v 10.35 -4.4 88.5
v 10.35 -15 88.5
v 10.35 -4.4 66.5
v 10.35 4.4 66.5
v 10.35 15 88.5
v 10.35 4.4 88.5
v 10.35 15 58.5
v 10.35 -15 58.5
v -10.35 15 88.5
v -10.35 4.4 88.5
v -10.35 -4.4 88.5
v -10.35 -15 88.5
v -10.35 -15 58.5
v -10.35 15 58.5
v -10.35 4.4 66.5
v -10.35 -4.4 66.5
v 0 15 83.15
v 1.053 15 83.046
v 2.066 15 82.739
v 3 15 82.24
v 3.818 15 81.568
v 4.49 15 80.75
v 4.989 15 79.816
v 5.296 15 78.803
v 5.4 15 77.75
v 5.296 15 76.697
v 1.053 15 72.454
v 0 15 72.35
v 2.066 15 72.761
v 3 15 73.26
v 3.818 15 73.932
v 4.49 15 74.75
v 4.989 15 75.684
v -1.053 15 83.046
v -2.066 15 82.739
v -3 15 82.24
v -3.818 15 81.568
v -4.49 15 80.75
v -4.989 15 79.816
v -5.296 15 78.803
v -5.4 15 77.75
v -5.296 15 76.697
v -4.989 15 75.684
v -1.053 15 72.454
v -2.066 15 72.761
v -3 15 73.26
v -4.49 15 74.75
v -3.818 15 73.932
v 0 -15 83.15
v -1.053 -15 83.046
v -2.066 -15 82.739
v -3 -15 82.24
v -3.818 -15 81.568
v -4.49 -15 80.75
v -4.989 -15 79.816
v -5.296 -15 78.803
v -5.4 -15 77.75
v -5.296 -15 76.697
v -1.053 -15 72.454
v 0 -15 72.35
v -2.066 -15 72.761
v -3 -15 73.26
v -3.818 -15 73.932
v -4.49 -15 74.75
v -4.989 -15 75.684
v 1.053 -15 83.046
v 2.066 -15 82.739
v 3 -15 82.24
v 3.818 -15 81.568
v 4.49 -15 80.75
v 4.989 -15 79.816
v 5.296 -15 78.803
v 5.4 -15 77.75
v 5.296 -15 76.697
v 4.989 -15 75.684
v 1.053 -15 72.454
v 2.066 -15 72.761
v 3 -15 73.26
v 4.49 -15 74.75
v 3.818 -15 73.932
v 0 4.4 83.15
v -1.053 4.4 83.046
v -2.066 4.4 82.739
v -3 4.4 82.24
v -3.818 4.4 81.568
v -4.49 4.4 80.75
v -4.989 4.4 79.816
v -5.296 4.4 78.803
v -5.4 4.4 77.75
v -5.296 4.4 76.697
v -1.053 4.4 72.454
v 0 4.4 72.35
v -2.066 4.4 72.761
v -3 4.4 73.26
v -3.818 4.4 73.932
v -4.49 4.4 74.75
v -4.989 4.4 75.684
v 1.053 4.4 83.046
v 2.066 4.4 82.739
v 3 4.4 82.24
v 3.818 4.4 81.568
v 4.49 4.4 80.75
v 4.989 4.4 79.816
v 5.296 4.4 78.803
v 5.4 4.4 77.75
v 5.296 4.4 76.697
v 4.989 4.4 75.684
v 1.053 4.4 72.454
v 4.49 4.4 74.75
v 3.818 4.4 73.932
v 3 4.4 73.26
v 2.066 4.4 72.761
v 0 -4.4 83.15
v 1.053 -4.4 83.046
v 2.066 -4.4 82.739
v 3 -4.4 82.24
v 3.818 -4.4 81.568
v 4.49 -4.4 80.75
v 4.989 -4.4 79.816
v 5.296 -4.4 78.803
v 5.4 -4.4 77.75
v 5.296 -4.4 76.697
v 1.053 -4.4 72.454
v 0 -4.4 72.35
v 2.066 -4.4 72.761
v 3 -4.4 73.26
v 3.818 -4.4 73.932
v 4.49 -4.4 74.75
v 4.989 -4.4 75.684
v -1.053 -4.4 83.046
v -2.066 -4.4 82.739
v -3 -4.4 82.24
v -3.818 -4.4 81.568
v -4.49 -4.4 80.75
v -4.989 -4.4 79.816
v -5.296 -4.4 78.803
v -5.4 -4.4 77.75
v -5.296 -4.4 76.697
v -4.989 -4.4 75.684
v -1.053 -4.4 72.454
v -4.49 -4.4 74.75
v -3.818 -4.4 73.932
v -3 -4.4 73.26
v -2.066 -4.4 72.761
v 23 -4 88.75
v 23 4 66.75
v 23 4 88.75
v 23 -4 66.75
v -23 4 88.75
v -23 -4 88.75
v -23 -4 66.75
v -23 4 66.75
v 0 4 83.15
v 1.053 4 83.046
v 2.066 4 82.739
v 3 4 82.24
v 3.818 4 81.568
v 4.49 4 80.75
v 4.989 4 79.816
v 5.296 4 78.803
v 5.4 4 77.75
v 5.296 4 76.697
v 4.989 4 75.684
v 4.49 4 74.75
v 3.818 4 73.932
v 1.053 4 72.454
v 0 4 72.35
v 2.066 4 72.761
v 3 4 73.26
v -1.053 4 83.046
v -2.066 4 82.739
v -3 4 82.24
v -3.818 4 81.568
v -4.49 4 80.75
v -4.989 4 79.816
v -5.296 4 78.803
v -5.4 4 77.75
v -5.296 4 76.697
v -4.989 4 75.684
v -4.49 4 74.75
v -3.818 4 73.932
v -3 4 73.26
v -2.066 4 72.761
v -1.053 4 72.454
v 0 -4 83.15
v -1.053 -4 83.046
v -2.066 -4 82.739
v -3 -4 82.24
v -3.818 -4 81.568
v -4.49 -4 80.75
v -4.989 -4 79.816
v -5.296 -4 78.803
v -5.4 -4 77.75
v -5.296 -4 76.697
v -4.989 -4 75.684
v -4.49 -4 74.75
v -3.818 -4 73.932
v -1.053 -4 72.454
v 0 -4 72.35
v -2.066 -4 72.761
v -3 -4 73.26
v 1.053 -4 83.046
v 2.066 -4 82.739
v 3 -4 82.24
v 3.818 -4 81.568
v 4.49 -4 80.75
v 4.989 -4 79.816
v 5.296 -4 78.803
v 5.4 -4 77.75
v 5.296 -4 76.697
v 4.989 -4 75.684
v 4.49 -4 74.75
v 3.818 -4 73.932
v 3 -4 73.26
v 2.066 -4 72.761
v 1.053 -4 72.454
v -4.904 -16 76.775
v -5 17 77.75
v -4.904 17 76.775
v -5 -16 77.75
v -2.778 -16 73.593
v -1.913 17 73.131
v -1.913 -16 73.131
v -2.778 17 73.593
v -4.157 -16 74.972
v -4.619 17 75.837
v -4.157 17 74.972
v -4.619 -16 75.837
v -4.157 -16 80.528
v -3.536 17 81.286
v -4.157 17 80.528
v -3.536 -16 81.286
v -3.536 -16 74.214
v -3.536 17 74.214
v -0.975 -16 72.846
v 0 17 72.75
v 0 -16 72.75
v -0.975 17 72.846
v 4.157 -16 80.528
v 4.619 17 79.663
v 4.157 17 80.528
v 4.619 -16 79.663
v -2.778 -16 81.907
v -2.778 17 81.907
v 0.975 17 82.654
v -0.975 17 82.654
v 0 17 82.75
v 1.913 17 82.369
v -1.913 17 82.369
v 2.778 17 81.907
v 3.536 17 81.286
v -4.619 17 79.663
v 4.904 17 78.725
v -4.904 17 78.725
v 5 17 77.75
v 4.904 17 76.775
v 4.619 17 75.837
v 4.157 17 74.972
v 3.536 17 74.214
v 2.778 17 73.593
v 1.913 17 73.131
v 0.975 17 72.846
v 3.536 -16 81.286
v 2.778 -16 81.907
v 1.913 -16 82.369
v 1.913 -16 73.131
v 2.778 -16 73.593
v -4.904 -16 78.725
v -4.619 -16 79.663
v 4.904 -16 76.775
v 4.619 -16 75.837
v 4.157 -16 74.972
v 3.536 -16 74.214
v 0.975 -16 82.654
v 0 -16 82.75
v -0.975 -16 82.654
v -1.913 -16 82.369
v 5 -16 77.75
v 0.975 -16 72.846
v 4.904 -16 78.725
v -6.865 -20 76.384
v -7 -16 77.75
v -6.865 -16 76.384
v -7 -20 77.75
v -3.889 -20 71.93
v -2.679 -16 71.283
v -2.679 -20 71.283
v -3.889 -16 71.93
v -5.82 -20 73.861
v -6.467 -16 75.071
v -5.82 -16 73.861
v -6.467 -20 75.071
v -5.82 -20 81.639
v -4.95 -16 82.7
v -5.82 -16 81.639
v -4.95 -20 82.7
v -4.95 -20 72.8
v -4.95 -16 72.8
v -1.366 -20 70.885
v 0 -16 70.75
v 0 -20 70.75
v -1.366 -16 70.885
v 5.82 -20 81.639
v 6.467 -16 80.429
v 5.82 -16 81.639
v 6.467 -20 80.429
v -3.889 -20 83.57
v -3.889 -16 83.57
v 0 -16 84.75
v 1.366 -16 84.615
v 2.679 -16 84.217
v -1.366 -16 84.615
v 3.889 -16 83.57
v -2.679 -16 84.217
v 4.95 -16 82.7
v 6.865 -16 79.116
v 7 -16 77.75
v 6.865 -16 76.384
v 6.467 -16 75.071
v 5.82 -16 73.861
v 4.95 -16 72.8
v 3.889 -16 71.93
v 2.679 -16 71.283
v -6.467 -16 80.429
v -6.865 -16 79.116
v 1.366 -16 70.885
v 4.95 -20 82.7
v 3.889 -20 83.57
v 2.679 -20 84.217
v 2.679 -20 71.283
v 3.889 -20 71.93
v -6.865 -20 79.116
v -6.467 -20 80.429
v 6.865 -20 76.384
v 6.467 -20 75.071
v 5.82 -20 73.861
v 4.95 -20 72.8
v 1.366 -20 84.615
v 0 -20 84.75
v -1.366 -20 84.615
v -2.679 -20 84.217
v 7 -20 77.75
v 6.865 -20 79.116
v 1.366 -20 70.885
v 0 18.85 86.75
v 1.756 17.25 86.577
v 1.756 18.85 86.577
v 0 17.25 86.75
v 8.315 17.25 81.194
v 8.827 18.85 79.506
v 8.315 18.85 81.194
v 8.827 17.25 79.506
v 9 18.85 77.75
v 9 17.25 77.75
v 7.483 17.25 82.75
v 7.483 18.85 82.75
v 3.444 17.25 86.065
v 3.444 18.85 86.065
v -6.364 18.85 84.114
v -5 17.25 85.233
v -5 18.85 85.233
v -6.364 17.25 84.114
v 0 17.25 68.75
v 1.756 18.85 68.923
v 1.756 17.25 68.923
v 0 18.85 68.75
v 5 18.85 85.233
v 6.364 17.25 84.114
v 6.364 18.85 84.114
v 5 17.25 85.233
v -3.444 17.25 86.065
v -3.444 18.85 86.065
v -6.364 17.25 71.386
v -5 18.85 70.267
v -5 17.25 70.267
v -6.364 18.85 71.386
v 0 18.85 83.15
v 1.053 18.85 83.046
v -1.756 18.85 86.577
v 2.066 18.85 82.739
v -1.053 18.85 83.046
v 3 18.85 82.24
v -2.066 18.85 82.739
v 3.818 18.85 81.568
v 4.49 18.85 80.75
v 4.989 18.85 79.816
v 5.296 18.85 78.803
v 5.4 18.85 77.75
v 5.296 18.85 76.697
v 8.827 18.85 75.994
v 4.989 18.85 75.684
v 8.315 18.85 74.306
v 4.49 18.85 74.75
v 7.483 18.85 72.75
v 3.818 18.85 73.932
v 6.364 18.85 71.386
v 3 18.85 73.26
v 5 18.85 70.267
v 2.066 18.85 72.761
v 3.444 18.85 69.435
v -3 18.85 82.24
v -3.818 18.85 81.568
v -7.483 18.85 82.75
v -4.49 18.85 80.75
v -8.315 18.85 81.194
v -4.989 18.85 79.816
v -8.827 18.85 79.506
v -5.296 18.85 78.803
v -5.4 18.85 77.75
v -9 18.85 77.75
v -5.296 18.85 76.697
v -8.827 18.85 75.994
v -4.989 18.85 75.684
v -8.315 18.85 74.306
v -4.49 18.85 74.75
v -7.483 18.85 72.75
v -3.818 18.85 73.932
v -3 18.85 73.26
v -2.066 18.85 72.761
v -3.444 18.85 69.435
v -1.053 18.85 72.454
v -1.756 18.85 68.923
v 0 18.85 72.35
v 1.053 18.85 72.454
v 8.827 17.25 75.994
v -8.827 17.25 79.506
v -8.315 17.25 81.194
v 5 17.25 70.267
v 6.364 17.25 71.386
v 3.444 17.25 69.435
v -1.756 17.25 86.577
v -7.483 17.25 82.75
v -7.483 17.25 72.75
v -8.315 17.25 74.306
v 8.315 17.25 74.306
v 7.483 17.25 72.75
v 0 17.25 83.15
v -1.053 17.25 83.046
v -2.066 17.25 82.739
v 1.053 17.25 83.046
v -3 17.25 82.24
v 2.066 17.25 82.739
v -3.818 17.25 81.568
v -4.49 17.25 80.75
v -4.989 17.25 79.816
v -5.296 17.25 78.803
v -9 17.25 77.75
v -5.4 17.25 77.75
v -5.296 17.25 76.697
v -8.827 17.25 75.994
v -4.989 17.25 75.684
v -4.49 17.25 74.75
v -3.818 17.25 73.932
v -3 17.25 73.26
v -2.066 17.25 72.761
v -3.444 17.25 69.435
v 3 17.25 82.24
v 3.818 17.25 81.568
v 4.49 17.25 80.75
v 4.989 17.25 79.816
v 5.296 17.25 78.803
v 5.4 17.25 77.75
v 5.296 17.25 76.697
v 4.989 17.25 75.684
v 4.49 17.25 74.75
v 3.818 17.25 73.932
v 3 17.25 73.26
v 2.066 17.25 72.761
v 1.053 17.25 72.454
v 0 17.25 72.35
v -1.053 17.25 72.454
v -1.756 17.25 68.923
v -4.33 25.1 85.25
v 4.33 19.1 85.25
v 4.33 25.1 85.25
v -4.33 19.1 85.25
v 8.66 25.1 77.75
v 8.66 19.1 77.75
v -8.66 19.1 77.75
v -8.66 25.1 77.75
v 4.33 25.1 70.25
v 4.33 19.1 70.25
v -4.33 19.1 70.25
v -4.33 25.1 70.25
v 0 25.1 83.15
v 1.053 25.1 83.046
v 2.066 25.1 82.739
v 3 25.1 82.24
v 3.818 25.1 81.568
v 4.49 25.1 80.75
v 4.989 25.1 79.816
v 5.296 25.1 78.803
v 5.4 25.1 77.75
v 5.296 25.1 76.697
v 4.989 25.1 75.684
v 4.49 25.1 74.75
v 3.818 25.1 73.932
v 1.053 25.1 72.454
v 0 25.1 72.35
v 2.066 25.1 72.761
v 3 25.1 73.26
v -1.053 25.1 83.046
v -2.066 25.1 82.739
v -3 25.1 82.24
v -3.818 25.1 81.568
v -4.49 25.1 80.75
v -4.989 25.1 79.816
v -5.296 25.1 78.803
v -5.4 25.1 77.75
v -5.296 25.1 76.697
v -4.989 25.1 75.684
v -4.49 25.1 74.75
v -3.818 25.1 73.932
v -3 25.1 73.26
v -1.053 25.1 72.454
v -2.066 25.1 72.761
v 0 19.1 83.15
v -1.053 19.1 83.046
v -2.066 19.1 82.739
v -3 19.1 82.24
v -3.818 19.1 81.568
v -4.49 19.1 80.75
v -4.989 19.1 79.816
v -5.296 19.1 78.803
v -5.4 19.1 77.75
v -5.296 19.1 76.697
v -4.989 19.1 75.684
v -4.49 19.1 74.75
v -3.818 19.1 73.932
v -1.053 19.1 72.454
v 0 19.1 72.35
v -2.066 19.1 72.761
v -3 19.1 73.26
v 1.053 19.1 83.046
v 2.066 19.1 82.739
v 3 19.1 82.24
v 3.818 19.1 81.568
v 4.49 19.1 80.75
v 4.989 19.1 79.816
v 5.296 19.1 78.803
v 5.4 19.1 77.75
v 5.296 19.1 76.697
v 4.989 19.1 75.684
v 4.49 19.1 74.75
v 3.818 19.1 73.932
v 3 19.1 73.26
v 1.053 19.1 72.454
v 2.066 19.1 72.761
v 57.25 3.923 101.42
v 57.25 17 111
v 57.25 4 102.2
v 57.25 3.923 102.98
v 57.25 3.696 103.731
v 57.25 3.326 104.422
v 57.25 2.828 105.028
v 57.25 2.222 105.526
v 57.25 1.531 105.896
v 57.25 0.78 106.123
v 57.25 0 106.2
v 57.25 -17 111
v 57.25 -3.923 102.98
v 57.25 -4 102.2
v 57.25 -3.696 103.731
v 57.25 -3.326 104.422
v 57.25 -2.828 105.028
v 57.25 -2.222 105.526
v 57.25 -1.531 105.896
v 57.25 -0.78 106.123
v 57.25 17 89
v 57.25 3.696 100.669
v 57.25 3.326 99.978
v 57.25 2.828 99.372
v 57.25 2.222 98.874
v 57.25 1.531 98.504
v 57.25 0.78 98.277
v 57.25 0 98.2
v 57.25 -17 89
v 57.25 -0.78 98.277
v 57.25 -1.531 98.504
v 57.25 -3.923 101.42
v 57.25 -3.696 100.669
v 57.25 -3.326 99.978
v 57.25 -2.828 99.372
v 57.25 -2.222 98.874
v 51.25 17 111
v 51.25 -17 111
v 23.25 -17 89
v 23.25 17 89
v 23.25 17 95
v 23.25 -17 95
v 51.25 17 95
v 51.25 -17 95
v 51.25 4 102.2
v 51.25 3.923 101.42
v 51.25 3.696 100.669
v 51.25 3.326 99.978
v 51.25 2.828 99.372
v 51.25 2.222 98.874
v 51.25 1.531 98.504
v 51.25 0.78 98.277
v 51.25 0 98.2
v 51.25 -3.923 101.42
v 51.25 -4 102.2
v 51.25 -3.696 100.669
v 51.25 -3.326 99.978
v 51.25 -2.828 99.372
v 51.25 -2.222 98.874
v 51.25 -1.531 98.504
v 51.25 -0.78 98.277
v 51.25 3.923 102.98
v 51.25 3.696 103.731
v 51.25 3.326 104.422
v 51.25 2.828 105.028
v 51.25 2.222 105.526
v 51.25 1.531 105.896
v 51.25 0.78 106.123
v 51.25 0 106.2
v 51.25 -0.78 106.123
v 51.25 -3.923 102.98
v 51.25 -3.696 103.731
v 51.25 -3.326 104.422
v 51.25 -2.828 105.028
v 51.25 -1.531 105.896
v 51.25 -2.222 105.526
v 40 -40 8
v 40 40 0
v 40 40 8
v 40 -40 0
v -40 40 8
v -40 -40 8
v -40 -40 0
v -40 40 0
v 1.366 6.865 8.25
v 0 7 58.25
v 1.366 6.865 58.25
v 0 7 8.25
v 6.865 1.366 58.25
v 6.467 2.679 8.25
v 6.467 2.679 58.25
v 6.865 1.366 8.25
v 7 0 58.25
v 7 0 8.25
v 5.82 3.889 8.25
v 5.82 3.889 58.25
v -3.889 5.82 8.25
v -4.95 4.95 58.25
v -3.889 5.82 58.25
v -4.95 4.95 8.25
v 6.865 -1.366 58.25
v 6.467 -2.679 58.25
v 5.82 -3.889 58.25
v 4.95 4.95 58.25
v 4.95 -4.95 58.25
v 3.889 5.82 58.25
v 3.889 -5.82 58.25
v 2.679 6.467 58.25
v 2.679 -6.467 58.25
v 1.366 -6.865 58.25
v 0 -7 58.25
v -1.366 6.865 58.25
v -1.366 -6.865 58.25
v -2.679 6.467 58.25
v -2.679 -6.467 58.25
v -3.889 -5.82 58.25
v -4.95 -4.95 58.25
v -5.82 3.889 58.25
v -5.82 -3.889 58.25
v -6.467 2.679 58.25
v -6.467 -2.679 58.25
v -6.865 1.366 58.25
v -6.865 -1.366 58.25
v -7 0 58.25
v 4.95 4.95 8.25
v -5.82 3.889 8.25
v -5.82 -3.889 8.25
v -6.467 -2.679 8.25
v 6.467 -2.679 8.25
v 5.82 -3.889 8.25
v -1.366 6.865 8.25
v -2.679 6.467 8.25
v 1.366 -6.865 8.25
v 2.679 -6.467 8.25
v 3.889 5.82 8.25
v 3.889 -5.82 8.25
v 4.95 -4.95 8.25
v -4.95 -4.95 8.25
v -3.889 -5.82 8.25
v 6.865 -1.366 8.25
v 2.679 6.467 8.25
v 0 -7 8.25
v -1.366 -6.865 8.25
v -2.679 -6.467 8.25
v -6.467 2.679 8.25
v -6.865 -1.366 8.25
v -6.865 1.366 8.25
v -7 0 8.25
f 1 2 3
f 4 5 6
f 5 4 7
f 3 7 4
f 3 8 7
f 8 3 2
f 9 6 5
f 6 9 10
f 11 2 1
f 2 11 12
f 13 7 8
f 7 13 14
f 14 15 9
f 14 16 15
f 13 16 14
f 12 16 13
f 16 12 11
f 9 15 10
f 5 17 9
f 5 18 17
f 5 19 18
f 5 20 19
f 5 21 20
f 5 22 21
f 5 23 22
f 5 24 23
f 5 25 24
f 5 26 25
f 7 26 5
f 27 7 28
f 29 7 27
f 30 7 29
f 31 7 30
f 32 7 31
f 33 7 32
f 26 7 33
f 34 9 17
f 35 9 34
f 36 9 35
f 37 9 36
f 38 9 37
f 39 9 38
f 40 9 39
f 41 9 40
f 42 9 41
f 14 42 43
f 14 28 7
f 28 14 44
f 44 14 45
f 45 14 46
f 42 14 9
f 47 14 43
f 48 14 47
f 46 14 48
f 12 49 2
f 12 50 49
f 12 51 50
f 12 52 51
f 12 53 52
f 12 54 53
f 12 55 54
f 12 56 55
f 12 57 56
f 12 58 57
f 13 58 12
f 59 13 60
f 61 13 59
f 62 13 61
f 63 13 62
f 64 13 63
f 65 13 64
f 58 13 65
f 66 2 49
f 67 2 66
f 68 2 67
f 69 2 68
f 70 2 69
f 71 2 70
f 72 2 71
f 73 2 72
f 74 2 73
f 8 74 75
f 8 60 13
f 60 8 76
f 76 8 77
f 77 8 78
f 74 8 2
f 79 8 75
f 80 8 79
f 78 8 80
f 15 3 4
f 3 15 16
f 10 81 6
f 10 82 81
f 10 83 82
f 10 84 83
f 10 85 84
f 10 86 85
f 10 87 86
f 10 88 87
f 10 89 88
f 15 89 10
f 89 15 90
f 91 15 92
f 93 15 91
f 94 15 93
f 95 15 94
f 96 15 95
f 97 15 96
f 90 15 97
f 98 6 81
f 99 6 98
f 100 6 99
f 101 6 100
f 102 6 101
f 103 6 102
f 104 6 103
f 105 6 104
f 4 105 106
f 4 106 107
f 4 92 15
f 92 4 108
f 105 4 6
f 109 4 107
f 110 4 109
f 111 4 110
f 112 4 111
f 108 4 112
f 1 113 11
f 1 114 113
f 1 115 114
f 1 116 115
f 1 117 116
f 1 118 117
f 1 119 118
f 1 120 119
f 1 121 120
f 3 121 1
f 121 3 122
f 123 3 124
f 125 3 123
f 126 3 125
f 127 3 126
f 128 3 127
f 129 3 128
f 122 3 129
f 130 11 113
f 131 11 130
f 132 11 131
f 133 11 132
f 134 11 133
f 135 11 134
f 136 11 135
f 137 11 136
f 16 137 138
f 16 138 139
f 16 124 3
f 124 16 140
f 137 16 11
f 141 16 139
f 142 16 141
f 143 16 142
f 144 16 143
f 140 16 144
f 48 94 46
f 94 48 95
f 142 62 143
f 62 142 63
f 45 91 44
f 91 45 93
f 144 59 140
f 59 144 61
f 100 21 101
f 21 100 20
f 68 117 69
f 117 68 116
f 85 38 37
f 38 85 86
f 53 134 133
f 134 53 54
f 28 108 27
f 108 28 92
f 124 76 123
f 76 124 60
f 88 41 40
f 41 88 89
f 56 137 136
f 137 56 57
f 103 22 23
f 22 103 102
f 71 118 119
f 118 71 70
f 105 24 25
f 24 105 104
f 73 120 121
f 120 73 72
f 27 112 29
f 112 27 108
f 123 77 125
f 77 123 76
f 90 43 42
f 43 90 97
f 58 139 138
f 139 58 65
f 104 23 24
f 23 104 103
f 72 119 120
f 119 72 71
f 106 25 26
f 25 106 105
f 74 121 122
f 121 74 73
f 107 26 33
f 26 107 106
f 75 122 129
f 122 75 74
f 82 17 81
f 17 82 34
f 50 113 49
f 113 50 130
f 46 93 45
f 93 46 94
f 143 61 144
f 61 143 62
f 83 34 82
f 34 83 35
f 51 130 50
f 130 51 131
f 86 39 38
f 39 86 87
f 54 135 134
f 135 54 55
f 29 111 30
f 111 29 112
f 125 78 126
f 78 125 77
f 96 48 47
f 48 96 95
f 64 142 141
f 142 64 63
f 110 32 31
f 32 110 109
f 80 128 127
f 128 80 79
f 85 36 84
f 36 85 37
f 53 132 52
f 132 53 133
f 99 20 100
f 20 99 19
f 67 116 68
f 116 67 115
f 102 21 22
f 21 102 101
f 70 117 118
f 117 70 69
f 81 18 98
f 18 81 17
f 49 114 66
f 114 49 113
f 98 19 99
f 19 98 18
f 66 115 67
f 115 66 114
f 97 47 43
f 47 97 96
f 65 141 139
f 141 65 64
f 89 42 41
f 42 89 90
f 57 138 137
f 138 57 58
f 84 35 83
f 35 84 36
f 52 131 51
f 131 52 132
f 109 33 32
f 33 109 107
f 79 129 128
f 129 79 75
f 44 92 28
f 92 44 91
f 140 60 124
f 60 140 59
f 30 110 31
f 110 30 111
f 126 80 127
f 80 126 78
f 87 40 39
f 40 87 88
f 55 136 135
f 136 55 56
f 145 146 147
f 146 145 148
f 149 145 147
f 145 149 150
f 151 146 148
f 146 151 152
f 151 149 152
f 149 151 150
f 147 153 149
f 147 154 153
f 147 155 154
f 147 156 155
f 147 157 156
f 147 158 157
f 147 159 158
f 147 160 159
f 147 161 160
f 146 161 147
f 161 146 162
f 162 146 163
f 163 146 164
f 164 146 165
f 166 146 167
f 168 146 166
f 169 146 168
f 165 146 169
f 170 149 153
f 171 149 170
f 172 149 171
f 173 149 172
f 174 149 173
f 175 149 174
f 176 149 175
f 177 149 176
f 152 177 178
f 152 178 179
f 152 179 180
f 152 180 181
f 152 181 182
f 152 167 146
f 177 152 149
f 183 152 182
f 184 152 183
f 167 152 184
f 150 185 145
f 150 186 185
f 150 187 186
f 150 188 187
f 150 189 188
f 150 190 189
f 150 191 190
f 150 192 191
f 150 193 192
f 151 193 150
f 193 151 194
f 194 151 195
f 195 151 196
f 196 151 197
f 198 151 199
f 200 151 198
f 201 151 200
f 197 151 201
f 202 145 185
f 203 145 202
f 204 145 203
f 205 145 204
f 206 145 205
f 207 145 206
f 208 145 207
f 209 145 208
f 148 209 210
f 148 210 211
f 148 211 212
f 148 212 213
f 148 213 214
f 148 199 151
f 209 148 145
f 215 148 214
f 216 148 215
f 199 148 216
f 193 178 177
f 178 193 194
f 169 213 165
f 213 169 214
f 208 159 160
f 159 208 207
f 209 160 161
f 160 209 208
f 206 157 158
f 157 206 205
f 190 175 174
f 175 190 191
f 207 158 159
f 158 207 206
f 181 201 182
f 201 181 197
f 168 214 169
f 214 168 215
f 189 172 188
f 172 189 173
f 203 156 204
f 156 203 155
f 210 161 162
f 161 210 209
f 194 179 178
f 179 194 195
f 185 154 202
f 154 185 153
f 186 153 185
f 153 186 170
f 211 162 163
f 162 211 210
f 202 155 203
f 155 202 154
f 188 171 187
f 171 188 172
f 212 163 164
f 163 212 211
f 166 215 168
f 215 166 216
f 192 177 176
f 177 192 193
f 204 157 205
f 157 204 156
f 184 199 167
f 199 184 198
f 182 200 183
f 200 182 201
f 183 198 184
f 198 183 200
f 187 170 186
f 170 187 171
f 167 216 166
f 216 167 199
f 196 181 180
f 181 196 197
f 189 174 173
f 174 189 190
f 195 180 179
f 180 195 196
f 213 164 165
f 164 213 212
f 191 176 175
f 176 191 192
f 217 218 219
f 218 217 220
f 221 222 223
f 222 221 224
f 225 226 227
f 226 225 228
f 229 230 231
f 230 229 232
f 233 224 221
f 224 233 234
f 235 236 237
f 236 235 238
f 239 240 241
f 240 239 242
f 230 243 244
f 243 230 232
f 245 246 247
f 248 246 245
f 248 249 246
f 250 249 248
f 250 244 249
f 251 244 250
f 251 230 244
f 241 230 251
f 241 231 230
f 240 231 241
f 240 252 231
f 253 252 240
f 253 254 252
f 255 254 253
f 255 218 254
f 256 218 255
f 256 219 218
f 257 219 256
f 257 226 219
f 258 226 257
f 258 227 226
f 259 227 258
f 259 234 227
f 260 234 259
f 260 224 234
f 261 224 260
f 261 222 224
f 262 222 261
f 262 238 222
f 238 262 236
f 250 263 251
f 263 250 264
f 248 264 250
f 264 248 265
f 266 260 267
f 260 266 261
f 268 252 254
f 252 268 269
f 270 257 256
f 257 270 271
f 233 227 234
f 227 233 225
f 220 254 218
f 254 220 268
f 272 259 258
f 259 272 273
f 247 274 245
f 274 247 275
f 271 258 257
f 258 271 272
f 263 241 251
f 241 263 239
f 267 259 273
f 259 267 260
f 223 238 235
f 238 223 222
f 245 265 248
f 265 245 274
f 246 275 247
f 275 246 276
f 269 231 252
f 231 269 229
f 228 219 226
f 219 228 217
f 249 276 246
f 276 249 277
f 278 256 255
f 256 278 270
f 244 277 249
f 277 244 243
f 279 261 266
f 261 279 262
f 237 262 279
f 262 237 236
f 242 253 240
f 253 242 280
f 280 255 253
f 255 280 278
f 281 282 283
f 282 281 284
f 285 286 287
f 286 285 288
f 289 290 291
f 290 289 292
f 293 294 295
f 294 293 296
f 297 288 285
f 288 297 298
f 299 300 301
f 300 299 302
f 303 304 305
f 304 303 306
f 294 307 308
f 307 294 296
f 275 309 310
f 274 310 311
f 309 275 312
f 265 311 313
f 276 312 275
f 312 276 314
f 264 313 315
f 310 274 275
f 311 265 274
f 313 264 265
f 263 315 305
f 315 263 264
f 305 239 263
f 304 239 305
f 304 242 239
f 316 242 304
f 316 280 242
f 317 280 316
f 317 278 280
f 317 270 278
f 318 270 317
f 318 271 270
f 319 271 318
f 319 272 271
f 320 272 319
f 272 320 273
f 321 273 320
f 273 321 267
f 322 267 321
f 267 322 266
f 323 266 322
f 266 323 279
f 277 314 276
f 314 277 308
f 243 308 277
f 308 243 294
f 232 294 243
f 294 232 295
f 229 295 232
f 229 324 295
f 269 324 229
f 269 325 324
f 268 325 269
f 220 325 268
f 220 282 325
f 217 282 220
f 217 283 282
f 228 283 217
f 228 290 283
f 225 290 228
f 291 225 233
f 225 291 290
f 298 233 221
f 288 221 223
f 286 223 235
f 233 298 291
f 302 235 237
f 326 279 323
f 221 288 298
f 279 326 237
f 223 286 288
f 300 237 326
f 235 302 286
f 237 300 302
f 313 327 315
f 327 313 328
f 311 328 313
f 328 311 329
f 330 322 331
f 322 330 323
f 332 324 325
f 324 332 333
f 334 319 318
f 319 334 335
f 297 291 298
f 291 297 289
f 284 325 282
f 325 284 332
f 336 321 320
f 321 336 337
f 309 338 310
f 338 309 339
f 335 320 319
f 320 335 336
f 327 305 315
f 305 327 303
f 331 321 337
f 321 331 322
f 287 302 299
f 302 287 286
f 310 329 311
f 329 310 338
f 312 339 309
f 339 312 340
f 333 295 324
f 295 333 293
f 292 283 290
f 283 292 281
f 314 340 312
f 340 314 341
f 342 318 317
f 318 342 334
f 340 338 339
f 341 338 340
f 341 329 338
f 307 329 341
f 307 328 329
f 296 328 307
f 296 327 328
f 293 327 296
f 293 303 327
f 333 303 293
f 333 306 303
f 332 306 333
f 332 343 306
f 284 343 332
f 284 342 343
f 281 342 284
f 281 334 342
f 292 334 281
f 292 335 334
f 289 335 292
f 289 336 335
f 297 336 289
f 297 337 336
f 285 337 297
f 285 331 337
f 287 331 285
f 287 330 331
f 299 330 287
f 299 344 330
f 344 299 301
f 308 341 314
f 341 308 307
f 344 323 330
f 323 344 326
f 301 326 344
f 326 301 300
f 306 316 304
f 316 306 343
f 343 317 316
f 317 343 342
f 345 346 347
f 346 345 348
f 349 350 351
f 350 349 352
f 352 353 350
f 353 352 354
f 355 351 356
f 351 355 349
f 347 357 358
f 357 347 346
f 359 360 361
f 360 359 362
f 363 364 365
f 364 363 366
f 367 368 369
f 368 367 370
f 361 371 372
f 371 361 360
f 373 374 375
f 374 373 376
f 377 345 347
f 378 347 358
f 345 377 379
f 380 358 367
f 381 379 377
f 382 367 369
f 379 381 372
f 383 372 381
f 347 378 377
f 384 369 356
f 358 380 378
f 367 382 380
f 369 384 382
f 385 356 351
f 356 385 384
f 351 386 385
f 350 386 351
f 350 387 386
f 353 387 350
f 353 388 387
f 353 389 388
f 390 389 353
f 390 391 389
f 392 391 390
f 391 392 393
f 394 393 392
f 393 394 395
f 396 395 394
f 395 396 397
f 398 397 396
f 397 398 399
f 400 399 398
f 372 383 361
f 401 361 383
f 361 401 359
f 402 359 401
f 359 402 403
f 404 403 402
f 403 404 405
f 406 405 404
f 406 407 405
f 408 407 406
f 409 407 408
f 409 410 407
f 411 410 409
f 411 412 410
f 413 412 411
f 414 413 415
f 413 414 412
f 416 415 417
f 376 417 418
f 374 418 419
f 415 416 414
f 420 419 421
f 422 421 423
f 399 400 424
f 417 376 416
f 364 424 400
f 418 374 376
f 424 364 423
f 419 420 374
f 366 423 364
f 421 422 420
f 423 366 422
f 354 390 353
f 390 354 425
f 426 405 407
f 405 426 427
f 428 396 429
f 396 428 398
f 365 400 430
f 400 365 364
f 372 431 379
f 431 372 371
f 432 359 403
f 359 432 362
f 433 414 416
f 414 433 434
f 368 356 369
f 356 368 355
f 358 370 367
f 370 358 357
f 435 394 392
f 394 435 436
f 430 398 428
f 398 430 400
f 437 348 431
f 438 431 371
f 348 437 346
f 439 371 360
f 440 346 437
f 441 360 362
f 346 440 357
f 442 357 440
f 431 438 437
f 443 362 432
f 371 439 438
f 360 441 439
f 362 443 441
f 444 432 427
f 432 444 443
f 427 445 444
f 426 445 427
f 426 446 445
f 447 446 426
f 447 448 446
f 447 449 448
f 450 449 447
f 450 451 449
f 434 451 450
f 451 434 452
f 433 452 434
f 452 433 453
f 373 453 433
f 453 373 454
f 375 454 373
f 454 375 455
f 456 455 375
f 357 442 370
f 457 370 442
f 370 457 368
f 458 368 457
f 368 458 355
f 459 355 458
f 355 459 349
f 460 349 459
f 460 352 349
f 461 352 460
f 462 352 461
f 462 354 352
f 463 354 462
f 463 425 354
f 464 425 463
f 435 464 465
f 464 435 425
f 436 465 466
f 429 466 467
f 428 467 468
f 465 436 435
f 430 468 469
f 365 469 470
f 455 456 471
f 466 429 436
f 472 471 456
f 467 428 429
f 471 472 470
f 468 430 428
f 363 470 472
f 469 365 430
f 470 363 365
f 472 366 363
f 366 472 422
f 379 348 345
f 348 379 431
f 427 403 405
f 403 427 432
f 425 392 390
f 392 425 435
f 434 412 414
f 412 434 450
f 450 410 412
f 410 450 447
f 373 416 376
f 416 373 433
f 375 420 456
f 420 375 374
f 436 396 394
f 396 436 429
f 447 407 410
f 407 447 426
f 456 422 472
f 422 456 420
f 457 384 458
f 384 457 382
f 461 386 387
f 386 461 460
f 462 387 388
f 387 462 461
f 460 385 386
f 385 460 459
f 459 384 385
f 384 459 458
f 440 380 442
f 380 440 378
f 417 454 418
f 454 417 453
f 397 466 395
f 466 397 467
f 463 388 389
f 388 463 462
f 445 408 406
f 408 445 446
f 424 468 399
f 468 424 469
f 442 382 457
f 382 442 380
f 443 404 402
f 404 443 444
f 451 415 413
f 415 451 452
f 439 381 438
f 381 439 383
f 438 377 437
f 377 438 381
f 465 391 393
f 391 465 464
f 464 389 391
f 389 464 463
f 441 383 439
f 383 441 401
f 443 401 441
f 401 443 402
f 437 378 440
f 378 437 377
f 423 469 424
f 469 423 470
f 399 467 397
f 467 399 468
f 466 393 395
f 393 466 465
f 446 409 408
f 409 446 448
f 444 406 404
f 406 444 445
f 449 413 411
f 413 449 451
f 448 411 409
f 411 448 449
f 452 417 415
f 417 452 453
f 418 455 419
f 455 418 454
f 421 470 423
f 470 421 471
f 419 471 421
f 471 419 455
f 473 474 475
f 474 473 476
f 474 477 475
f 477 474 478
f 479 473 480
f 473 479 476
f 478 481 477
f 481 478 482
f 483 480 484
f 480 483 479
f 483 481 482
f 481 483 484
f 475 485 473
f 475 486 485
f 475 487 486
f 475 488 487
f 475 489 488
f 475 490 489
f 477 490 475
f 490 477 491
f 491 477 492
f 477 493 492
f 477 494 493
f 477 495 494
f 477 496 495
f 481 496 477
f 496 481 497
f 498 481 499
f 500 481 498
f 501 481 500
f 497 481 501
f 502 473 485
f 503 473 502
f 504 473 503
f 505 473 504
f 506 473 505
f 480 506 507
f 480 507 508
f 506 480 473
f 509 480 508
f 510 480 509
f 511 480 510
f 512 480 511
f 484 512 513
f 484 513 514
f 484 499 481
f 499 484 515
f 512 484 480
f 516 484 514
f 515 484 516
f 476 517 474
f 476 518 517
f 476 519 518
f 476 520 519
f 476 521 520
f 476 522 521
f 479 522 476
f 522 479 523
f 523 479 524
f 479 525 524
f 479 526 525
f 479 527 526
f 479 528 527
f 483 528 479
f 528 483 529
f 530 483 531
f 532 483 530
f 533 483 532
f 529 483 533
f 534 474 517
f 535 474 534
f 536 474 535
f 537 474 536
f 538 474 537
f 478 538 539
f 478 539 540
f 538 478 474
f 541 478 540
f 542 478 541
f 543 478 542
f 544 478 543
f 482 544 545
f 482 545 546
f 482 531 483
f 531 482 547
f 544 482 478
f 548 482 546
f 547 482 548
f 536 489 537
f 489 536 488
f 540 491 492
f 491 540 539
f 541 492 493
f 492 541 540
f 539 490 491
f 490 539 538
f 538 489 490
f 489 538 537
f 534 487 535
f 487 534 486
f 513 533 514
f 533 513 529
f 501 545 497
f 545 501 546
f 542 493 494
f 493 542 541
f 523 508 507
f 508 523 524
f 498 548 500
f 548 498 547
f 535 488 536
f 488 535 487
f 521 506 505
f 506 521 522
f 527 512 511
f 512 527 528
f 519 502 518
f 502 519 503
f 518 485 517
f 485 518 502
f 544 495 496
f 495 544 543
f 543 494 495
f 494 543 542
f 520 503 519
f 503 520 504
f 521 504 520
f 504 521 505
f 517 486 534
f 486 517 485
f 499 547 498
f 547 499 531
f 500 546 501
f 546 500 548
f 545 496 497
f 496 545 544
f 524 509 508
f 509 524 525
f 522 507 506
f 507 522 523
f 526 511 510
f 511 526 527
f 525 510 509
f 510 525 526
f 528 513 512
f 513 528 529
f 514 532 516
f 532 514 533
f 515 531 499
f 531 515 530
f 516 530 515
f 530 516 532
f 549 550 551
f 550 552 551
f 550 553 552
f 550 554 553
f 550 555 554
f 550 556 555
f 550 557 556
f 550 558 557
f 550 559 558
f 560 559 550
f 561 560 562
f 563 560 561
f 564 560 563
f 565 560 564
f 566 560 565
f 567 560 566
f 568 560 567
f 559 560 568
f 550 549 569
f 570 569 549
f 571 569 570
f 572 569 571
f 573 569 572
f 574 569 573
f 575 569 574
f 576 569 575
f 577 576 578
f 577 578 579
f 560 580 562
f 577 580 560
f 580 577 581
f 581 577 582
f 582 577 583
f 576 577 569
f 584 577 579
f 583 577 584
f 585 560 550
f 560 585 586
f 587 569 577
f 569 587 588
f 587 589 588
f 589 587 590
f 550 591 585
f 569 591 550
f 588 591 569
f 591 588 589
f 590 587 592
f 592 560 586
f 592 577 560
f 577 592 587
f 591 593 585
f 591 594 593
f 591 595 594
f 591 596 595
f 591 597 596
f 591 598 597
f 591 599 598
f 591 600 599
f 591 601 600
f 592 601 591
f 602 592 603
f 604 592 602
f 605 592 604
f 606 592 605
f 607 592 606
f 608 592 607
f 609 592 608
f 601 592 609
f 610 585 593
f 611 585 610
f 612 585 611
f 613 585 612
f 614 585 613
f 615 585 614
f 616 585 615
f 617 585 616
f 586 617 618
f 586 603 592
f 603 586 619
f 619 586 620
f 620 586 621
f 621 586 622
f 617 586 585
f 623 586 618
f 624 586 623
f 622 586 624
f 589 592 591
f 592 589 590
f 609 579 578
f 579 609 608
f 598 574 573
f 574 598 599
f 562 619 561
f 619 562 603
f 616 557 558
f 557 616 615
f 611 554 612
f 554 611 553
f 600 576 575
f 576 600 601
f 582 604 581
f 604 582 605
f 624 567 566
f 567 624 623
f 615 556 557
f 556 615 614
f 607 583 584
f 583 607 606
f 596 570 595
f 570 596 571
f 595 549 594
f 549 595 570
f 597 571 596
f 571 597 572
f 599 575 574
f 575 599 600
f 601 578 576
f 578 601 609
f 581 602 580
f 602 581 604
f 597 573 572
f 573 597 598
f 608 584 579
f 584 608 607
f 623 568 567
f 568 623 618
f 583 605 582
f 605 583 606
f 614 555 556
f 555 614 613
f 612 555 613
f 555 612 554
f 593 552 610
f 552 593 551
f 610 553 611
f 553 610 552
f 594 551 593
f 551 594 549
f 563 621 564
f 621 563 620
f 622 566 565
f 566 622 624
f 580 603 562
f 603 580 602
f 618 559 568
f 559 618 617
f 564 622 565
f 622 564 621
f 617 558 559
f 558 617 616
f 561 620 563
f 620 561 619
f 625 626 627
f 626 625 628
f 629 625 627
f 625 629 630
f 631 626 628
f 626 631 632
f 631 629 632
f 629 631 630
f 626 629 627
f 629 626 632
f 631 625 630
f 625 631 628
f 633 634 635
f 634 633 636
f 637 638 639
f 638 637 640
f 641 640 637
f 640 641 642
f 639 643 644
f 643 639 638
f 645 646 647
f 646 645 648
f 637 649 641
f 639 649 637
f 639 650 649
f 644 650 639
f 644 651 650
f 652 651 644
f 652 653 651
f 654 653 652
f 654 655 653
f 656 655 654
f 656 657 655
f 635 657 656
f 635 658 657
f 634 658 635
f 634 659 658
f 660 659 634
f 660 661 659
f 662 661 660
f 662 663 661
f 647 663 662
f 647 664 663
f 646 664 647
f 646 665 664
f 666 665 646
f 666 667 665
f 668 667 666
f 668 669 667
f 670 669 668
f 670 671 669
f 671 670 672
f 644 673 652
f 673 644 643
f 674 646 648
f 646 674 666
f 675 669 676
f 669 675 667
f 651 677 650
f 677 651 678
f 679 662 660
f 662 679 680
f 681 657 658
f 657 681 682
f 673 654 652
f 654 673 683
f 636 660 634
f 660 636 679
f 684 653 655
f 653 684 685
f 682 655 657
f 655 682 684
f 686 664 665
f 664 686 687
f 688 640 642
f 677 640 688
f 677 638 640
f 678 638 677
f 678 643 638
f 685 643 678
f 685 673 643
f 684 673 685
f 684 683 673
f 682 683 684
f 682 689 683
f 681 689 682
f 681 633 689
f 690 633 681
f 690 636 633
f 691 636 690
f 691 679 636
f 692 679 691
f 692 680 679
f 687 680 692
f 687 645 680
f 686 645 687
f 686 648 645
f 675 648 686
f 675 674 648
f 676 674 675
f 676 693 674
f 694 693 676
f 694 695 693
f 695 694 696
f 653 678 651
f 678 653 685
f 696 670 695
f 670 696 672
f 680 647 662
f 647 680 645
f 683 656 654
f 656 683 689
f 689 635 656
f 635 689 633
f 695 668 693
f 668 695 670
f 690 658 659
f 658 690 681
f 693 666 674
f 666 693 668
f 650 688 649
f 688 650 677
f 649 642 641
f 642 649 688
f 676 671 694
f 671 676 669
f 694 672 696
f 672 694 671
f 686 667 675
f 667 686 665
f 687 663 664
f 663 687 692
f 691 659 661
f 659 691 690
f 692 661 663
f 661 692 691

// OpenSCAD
$fn = 32;

// ------------------------------------------------------------------------
// Lamp arm: column d14 x 50 mm, arm 46 mm
// Every part is its own module, assembly() places every instance.
// ------------------------------------------------------------------------

// --- part 1 ---
module lamp_base() {
  difference() {
    translate([-40, -40, 0]) cube([80, 80, 8]);
  }
}

// --- part 2 ---
module lamp_column() {
  cylinder(h = 50, d = 14);
}

// --- part 3 ---
module head_fork() {
  difference() {
    translate([-10.35, -15, 0]) cube([20.7, 30, 30]);
    translate([-11.35, -4.4, 8]) cube([22.7, 8.8, 23]);
    translate([0, 0, 19.25]) rotate([90, 0, 0]) cylinder(h = 32, d = 10.8, center = true);
  }
}

// --- part 4 ---
module lamp_arm() {
  difference() {
    translate([-23, -4, 0]) cube([46, 8, 22]);
    translate([0, 0, 11]) rotate([90, 0, 0]) cylinder(h = 10, d = 10.8, center = true);
  }
}

// --- part 5 ---
module arm_pin() {
  rotate([0, 90, 0]) cylinder(h = 34, d = 10, center = true);
  translate([-20, 0, 0]) rotate([0, 90, 0]) cylinder(h = 4, d = 14);
}

// --- part 6 ---
module arm_washer() {
  difference() {
      translate([0, 0, 0]) cylinder(h = 1.6, d = 18);
      translate([0, 0, -1]) cylinder(h = 3.6, d = 10.8);
    }
}

// --- part 7 ---
module arm_nut() {
  difference() {
    linear_extrude(height = 6) polygon(points = [[8.66, 0], [4.33, 7.5], [-4.33, 7.5], [-8.66, 0], [-4.33, -7.5], [4.33, -7.5]]);
    translate([0, 0, -1]) cylinder(h = 8, d = 10.8);
  }
}

// --- part 8 ---
module shade_bracket() {
  difference() {
    translate([-17, -17, 0]) cube([34, 34, 22]);
    translate([-18, -18, 6]) cube([29, 36, 17]);
    translate([14, 0, 13.2]) rotate([0, 90, 0]) cylinder(h = 8, d = 8, center = true);
  }
}

// --- assembly ---
module assembly() {
  color([0.80, 0.24, 0.20]) translate([0, 0, 0]) rotate([0, 0, 0]) lamp_base();
  color([0.20, 0.45, 0.75]) translate([0, 0, 8.25]) rotate([0, 0, 0]) lamp_column();
  color([0.25, 0.62, 0.32]) translate([0, 0, 58.5]) rotate([0, 0, 0]) head_fork();
  color([0.92, 0.70, 0.18]) translate([0, 0, 66.75]) rotate([0, 0, 0]) lamp_arm();
  color([0.58, 0.35, 0.70]) translate([0, 0, 77.75]) rotate([0, 0, 90]) arm_pin();
  color([0.16, 0.66, 0.66]) translate([0, 18.85, 77.75]) rotate([90, 0, 0]) arm_washer();
  color([0.85, 0.48, 0.18]) translate([0, 25.1, 77.75]) rotate([90, 0, 0]) arm_nut();
  color([0.55, 0.60, 0.65]) translate([40.25, 0, 89]) rotate([0, 0, 0]) shade_bracket();
}

assembly();
